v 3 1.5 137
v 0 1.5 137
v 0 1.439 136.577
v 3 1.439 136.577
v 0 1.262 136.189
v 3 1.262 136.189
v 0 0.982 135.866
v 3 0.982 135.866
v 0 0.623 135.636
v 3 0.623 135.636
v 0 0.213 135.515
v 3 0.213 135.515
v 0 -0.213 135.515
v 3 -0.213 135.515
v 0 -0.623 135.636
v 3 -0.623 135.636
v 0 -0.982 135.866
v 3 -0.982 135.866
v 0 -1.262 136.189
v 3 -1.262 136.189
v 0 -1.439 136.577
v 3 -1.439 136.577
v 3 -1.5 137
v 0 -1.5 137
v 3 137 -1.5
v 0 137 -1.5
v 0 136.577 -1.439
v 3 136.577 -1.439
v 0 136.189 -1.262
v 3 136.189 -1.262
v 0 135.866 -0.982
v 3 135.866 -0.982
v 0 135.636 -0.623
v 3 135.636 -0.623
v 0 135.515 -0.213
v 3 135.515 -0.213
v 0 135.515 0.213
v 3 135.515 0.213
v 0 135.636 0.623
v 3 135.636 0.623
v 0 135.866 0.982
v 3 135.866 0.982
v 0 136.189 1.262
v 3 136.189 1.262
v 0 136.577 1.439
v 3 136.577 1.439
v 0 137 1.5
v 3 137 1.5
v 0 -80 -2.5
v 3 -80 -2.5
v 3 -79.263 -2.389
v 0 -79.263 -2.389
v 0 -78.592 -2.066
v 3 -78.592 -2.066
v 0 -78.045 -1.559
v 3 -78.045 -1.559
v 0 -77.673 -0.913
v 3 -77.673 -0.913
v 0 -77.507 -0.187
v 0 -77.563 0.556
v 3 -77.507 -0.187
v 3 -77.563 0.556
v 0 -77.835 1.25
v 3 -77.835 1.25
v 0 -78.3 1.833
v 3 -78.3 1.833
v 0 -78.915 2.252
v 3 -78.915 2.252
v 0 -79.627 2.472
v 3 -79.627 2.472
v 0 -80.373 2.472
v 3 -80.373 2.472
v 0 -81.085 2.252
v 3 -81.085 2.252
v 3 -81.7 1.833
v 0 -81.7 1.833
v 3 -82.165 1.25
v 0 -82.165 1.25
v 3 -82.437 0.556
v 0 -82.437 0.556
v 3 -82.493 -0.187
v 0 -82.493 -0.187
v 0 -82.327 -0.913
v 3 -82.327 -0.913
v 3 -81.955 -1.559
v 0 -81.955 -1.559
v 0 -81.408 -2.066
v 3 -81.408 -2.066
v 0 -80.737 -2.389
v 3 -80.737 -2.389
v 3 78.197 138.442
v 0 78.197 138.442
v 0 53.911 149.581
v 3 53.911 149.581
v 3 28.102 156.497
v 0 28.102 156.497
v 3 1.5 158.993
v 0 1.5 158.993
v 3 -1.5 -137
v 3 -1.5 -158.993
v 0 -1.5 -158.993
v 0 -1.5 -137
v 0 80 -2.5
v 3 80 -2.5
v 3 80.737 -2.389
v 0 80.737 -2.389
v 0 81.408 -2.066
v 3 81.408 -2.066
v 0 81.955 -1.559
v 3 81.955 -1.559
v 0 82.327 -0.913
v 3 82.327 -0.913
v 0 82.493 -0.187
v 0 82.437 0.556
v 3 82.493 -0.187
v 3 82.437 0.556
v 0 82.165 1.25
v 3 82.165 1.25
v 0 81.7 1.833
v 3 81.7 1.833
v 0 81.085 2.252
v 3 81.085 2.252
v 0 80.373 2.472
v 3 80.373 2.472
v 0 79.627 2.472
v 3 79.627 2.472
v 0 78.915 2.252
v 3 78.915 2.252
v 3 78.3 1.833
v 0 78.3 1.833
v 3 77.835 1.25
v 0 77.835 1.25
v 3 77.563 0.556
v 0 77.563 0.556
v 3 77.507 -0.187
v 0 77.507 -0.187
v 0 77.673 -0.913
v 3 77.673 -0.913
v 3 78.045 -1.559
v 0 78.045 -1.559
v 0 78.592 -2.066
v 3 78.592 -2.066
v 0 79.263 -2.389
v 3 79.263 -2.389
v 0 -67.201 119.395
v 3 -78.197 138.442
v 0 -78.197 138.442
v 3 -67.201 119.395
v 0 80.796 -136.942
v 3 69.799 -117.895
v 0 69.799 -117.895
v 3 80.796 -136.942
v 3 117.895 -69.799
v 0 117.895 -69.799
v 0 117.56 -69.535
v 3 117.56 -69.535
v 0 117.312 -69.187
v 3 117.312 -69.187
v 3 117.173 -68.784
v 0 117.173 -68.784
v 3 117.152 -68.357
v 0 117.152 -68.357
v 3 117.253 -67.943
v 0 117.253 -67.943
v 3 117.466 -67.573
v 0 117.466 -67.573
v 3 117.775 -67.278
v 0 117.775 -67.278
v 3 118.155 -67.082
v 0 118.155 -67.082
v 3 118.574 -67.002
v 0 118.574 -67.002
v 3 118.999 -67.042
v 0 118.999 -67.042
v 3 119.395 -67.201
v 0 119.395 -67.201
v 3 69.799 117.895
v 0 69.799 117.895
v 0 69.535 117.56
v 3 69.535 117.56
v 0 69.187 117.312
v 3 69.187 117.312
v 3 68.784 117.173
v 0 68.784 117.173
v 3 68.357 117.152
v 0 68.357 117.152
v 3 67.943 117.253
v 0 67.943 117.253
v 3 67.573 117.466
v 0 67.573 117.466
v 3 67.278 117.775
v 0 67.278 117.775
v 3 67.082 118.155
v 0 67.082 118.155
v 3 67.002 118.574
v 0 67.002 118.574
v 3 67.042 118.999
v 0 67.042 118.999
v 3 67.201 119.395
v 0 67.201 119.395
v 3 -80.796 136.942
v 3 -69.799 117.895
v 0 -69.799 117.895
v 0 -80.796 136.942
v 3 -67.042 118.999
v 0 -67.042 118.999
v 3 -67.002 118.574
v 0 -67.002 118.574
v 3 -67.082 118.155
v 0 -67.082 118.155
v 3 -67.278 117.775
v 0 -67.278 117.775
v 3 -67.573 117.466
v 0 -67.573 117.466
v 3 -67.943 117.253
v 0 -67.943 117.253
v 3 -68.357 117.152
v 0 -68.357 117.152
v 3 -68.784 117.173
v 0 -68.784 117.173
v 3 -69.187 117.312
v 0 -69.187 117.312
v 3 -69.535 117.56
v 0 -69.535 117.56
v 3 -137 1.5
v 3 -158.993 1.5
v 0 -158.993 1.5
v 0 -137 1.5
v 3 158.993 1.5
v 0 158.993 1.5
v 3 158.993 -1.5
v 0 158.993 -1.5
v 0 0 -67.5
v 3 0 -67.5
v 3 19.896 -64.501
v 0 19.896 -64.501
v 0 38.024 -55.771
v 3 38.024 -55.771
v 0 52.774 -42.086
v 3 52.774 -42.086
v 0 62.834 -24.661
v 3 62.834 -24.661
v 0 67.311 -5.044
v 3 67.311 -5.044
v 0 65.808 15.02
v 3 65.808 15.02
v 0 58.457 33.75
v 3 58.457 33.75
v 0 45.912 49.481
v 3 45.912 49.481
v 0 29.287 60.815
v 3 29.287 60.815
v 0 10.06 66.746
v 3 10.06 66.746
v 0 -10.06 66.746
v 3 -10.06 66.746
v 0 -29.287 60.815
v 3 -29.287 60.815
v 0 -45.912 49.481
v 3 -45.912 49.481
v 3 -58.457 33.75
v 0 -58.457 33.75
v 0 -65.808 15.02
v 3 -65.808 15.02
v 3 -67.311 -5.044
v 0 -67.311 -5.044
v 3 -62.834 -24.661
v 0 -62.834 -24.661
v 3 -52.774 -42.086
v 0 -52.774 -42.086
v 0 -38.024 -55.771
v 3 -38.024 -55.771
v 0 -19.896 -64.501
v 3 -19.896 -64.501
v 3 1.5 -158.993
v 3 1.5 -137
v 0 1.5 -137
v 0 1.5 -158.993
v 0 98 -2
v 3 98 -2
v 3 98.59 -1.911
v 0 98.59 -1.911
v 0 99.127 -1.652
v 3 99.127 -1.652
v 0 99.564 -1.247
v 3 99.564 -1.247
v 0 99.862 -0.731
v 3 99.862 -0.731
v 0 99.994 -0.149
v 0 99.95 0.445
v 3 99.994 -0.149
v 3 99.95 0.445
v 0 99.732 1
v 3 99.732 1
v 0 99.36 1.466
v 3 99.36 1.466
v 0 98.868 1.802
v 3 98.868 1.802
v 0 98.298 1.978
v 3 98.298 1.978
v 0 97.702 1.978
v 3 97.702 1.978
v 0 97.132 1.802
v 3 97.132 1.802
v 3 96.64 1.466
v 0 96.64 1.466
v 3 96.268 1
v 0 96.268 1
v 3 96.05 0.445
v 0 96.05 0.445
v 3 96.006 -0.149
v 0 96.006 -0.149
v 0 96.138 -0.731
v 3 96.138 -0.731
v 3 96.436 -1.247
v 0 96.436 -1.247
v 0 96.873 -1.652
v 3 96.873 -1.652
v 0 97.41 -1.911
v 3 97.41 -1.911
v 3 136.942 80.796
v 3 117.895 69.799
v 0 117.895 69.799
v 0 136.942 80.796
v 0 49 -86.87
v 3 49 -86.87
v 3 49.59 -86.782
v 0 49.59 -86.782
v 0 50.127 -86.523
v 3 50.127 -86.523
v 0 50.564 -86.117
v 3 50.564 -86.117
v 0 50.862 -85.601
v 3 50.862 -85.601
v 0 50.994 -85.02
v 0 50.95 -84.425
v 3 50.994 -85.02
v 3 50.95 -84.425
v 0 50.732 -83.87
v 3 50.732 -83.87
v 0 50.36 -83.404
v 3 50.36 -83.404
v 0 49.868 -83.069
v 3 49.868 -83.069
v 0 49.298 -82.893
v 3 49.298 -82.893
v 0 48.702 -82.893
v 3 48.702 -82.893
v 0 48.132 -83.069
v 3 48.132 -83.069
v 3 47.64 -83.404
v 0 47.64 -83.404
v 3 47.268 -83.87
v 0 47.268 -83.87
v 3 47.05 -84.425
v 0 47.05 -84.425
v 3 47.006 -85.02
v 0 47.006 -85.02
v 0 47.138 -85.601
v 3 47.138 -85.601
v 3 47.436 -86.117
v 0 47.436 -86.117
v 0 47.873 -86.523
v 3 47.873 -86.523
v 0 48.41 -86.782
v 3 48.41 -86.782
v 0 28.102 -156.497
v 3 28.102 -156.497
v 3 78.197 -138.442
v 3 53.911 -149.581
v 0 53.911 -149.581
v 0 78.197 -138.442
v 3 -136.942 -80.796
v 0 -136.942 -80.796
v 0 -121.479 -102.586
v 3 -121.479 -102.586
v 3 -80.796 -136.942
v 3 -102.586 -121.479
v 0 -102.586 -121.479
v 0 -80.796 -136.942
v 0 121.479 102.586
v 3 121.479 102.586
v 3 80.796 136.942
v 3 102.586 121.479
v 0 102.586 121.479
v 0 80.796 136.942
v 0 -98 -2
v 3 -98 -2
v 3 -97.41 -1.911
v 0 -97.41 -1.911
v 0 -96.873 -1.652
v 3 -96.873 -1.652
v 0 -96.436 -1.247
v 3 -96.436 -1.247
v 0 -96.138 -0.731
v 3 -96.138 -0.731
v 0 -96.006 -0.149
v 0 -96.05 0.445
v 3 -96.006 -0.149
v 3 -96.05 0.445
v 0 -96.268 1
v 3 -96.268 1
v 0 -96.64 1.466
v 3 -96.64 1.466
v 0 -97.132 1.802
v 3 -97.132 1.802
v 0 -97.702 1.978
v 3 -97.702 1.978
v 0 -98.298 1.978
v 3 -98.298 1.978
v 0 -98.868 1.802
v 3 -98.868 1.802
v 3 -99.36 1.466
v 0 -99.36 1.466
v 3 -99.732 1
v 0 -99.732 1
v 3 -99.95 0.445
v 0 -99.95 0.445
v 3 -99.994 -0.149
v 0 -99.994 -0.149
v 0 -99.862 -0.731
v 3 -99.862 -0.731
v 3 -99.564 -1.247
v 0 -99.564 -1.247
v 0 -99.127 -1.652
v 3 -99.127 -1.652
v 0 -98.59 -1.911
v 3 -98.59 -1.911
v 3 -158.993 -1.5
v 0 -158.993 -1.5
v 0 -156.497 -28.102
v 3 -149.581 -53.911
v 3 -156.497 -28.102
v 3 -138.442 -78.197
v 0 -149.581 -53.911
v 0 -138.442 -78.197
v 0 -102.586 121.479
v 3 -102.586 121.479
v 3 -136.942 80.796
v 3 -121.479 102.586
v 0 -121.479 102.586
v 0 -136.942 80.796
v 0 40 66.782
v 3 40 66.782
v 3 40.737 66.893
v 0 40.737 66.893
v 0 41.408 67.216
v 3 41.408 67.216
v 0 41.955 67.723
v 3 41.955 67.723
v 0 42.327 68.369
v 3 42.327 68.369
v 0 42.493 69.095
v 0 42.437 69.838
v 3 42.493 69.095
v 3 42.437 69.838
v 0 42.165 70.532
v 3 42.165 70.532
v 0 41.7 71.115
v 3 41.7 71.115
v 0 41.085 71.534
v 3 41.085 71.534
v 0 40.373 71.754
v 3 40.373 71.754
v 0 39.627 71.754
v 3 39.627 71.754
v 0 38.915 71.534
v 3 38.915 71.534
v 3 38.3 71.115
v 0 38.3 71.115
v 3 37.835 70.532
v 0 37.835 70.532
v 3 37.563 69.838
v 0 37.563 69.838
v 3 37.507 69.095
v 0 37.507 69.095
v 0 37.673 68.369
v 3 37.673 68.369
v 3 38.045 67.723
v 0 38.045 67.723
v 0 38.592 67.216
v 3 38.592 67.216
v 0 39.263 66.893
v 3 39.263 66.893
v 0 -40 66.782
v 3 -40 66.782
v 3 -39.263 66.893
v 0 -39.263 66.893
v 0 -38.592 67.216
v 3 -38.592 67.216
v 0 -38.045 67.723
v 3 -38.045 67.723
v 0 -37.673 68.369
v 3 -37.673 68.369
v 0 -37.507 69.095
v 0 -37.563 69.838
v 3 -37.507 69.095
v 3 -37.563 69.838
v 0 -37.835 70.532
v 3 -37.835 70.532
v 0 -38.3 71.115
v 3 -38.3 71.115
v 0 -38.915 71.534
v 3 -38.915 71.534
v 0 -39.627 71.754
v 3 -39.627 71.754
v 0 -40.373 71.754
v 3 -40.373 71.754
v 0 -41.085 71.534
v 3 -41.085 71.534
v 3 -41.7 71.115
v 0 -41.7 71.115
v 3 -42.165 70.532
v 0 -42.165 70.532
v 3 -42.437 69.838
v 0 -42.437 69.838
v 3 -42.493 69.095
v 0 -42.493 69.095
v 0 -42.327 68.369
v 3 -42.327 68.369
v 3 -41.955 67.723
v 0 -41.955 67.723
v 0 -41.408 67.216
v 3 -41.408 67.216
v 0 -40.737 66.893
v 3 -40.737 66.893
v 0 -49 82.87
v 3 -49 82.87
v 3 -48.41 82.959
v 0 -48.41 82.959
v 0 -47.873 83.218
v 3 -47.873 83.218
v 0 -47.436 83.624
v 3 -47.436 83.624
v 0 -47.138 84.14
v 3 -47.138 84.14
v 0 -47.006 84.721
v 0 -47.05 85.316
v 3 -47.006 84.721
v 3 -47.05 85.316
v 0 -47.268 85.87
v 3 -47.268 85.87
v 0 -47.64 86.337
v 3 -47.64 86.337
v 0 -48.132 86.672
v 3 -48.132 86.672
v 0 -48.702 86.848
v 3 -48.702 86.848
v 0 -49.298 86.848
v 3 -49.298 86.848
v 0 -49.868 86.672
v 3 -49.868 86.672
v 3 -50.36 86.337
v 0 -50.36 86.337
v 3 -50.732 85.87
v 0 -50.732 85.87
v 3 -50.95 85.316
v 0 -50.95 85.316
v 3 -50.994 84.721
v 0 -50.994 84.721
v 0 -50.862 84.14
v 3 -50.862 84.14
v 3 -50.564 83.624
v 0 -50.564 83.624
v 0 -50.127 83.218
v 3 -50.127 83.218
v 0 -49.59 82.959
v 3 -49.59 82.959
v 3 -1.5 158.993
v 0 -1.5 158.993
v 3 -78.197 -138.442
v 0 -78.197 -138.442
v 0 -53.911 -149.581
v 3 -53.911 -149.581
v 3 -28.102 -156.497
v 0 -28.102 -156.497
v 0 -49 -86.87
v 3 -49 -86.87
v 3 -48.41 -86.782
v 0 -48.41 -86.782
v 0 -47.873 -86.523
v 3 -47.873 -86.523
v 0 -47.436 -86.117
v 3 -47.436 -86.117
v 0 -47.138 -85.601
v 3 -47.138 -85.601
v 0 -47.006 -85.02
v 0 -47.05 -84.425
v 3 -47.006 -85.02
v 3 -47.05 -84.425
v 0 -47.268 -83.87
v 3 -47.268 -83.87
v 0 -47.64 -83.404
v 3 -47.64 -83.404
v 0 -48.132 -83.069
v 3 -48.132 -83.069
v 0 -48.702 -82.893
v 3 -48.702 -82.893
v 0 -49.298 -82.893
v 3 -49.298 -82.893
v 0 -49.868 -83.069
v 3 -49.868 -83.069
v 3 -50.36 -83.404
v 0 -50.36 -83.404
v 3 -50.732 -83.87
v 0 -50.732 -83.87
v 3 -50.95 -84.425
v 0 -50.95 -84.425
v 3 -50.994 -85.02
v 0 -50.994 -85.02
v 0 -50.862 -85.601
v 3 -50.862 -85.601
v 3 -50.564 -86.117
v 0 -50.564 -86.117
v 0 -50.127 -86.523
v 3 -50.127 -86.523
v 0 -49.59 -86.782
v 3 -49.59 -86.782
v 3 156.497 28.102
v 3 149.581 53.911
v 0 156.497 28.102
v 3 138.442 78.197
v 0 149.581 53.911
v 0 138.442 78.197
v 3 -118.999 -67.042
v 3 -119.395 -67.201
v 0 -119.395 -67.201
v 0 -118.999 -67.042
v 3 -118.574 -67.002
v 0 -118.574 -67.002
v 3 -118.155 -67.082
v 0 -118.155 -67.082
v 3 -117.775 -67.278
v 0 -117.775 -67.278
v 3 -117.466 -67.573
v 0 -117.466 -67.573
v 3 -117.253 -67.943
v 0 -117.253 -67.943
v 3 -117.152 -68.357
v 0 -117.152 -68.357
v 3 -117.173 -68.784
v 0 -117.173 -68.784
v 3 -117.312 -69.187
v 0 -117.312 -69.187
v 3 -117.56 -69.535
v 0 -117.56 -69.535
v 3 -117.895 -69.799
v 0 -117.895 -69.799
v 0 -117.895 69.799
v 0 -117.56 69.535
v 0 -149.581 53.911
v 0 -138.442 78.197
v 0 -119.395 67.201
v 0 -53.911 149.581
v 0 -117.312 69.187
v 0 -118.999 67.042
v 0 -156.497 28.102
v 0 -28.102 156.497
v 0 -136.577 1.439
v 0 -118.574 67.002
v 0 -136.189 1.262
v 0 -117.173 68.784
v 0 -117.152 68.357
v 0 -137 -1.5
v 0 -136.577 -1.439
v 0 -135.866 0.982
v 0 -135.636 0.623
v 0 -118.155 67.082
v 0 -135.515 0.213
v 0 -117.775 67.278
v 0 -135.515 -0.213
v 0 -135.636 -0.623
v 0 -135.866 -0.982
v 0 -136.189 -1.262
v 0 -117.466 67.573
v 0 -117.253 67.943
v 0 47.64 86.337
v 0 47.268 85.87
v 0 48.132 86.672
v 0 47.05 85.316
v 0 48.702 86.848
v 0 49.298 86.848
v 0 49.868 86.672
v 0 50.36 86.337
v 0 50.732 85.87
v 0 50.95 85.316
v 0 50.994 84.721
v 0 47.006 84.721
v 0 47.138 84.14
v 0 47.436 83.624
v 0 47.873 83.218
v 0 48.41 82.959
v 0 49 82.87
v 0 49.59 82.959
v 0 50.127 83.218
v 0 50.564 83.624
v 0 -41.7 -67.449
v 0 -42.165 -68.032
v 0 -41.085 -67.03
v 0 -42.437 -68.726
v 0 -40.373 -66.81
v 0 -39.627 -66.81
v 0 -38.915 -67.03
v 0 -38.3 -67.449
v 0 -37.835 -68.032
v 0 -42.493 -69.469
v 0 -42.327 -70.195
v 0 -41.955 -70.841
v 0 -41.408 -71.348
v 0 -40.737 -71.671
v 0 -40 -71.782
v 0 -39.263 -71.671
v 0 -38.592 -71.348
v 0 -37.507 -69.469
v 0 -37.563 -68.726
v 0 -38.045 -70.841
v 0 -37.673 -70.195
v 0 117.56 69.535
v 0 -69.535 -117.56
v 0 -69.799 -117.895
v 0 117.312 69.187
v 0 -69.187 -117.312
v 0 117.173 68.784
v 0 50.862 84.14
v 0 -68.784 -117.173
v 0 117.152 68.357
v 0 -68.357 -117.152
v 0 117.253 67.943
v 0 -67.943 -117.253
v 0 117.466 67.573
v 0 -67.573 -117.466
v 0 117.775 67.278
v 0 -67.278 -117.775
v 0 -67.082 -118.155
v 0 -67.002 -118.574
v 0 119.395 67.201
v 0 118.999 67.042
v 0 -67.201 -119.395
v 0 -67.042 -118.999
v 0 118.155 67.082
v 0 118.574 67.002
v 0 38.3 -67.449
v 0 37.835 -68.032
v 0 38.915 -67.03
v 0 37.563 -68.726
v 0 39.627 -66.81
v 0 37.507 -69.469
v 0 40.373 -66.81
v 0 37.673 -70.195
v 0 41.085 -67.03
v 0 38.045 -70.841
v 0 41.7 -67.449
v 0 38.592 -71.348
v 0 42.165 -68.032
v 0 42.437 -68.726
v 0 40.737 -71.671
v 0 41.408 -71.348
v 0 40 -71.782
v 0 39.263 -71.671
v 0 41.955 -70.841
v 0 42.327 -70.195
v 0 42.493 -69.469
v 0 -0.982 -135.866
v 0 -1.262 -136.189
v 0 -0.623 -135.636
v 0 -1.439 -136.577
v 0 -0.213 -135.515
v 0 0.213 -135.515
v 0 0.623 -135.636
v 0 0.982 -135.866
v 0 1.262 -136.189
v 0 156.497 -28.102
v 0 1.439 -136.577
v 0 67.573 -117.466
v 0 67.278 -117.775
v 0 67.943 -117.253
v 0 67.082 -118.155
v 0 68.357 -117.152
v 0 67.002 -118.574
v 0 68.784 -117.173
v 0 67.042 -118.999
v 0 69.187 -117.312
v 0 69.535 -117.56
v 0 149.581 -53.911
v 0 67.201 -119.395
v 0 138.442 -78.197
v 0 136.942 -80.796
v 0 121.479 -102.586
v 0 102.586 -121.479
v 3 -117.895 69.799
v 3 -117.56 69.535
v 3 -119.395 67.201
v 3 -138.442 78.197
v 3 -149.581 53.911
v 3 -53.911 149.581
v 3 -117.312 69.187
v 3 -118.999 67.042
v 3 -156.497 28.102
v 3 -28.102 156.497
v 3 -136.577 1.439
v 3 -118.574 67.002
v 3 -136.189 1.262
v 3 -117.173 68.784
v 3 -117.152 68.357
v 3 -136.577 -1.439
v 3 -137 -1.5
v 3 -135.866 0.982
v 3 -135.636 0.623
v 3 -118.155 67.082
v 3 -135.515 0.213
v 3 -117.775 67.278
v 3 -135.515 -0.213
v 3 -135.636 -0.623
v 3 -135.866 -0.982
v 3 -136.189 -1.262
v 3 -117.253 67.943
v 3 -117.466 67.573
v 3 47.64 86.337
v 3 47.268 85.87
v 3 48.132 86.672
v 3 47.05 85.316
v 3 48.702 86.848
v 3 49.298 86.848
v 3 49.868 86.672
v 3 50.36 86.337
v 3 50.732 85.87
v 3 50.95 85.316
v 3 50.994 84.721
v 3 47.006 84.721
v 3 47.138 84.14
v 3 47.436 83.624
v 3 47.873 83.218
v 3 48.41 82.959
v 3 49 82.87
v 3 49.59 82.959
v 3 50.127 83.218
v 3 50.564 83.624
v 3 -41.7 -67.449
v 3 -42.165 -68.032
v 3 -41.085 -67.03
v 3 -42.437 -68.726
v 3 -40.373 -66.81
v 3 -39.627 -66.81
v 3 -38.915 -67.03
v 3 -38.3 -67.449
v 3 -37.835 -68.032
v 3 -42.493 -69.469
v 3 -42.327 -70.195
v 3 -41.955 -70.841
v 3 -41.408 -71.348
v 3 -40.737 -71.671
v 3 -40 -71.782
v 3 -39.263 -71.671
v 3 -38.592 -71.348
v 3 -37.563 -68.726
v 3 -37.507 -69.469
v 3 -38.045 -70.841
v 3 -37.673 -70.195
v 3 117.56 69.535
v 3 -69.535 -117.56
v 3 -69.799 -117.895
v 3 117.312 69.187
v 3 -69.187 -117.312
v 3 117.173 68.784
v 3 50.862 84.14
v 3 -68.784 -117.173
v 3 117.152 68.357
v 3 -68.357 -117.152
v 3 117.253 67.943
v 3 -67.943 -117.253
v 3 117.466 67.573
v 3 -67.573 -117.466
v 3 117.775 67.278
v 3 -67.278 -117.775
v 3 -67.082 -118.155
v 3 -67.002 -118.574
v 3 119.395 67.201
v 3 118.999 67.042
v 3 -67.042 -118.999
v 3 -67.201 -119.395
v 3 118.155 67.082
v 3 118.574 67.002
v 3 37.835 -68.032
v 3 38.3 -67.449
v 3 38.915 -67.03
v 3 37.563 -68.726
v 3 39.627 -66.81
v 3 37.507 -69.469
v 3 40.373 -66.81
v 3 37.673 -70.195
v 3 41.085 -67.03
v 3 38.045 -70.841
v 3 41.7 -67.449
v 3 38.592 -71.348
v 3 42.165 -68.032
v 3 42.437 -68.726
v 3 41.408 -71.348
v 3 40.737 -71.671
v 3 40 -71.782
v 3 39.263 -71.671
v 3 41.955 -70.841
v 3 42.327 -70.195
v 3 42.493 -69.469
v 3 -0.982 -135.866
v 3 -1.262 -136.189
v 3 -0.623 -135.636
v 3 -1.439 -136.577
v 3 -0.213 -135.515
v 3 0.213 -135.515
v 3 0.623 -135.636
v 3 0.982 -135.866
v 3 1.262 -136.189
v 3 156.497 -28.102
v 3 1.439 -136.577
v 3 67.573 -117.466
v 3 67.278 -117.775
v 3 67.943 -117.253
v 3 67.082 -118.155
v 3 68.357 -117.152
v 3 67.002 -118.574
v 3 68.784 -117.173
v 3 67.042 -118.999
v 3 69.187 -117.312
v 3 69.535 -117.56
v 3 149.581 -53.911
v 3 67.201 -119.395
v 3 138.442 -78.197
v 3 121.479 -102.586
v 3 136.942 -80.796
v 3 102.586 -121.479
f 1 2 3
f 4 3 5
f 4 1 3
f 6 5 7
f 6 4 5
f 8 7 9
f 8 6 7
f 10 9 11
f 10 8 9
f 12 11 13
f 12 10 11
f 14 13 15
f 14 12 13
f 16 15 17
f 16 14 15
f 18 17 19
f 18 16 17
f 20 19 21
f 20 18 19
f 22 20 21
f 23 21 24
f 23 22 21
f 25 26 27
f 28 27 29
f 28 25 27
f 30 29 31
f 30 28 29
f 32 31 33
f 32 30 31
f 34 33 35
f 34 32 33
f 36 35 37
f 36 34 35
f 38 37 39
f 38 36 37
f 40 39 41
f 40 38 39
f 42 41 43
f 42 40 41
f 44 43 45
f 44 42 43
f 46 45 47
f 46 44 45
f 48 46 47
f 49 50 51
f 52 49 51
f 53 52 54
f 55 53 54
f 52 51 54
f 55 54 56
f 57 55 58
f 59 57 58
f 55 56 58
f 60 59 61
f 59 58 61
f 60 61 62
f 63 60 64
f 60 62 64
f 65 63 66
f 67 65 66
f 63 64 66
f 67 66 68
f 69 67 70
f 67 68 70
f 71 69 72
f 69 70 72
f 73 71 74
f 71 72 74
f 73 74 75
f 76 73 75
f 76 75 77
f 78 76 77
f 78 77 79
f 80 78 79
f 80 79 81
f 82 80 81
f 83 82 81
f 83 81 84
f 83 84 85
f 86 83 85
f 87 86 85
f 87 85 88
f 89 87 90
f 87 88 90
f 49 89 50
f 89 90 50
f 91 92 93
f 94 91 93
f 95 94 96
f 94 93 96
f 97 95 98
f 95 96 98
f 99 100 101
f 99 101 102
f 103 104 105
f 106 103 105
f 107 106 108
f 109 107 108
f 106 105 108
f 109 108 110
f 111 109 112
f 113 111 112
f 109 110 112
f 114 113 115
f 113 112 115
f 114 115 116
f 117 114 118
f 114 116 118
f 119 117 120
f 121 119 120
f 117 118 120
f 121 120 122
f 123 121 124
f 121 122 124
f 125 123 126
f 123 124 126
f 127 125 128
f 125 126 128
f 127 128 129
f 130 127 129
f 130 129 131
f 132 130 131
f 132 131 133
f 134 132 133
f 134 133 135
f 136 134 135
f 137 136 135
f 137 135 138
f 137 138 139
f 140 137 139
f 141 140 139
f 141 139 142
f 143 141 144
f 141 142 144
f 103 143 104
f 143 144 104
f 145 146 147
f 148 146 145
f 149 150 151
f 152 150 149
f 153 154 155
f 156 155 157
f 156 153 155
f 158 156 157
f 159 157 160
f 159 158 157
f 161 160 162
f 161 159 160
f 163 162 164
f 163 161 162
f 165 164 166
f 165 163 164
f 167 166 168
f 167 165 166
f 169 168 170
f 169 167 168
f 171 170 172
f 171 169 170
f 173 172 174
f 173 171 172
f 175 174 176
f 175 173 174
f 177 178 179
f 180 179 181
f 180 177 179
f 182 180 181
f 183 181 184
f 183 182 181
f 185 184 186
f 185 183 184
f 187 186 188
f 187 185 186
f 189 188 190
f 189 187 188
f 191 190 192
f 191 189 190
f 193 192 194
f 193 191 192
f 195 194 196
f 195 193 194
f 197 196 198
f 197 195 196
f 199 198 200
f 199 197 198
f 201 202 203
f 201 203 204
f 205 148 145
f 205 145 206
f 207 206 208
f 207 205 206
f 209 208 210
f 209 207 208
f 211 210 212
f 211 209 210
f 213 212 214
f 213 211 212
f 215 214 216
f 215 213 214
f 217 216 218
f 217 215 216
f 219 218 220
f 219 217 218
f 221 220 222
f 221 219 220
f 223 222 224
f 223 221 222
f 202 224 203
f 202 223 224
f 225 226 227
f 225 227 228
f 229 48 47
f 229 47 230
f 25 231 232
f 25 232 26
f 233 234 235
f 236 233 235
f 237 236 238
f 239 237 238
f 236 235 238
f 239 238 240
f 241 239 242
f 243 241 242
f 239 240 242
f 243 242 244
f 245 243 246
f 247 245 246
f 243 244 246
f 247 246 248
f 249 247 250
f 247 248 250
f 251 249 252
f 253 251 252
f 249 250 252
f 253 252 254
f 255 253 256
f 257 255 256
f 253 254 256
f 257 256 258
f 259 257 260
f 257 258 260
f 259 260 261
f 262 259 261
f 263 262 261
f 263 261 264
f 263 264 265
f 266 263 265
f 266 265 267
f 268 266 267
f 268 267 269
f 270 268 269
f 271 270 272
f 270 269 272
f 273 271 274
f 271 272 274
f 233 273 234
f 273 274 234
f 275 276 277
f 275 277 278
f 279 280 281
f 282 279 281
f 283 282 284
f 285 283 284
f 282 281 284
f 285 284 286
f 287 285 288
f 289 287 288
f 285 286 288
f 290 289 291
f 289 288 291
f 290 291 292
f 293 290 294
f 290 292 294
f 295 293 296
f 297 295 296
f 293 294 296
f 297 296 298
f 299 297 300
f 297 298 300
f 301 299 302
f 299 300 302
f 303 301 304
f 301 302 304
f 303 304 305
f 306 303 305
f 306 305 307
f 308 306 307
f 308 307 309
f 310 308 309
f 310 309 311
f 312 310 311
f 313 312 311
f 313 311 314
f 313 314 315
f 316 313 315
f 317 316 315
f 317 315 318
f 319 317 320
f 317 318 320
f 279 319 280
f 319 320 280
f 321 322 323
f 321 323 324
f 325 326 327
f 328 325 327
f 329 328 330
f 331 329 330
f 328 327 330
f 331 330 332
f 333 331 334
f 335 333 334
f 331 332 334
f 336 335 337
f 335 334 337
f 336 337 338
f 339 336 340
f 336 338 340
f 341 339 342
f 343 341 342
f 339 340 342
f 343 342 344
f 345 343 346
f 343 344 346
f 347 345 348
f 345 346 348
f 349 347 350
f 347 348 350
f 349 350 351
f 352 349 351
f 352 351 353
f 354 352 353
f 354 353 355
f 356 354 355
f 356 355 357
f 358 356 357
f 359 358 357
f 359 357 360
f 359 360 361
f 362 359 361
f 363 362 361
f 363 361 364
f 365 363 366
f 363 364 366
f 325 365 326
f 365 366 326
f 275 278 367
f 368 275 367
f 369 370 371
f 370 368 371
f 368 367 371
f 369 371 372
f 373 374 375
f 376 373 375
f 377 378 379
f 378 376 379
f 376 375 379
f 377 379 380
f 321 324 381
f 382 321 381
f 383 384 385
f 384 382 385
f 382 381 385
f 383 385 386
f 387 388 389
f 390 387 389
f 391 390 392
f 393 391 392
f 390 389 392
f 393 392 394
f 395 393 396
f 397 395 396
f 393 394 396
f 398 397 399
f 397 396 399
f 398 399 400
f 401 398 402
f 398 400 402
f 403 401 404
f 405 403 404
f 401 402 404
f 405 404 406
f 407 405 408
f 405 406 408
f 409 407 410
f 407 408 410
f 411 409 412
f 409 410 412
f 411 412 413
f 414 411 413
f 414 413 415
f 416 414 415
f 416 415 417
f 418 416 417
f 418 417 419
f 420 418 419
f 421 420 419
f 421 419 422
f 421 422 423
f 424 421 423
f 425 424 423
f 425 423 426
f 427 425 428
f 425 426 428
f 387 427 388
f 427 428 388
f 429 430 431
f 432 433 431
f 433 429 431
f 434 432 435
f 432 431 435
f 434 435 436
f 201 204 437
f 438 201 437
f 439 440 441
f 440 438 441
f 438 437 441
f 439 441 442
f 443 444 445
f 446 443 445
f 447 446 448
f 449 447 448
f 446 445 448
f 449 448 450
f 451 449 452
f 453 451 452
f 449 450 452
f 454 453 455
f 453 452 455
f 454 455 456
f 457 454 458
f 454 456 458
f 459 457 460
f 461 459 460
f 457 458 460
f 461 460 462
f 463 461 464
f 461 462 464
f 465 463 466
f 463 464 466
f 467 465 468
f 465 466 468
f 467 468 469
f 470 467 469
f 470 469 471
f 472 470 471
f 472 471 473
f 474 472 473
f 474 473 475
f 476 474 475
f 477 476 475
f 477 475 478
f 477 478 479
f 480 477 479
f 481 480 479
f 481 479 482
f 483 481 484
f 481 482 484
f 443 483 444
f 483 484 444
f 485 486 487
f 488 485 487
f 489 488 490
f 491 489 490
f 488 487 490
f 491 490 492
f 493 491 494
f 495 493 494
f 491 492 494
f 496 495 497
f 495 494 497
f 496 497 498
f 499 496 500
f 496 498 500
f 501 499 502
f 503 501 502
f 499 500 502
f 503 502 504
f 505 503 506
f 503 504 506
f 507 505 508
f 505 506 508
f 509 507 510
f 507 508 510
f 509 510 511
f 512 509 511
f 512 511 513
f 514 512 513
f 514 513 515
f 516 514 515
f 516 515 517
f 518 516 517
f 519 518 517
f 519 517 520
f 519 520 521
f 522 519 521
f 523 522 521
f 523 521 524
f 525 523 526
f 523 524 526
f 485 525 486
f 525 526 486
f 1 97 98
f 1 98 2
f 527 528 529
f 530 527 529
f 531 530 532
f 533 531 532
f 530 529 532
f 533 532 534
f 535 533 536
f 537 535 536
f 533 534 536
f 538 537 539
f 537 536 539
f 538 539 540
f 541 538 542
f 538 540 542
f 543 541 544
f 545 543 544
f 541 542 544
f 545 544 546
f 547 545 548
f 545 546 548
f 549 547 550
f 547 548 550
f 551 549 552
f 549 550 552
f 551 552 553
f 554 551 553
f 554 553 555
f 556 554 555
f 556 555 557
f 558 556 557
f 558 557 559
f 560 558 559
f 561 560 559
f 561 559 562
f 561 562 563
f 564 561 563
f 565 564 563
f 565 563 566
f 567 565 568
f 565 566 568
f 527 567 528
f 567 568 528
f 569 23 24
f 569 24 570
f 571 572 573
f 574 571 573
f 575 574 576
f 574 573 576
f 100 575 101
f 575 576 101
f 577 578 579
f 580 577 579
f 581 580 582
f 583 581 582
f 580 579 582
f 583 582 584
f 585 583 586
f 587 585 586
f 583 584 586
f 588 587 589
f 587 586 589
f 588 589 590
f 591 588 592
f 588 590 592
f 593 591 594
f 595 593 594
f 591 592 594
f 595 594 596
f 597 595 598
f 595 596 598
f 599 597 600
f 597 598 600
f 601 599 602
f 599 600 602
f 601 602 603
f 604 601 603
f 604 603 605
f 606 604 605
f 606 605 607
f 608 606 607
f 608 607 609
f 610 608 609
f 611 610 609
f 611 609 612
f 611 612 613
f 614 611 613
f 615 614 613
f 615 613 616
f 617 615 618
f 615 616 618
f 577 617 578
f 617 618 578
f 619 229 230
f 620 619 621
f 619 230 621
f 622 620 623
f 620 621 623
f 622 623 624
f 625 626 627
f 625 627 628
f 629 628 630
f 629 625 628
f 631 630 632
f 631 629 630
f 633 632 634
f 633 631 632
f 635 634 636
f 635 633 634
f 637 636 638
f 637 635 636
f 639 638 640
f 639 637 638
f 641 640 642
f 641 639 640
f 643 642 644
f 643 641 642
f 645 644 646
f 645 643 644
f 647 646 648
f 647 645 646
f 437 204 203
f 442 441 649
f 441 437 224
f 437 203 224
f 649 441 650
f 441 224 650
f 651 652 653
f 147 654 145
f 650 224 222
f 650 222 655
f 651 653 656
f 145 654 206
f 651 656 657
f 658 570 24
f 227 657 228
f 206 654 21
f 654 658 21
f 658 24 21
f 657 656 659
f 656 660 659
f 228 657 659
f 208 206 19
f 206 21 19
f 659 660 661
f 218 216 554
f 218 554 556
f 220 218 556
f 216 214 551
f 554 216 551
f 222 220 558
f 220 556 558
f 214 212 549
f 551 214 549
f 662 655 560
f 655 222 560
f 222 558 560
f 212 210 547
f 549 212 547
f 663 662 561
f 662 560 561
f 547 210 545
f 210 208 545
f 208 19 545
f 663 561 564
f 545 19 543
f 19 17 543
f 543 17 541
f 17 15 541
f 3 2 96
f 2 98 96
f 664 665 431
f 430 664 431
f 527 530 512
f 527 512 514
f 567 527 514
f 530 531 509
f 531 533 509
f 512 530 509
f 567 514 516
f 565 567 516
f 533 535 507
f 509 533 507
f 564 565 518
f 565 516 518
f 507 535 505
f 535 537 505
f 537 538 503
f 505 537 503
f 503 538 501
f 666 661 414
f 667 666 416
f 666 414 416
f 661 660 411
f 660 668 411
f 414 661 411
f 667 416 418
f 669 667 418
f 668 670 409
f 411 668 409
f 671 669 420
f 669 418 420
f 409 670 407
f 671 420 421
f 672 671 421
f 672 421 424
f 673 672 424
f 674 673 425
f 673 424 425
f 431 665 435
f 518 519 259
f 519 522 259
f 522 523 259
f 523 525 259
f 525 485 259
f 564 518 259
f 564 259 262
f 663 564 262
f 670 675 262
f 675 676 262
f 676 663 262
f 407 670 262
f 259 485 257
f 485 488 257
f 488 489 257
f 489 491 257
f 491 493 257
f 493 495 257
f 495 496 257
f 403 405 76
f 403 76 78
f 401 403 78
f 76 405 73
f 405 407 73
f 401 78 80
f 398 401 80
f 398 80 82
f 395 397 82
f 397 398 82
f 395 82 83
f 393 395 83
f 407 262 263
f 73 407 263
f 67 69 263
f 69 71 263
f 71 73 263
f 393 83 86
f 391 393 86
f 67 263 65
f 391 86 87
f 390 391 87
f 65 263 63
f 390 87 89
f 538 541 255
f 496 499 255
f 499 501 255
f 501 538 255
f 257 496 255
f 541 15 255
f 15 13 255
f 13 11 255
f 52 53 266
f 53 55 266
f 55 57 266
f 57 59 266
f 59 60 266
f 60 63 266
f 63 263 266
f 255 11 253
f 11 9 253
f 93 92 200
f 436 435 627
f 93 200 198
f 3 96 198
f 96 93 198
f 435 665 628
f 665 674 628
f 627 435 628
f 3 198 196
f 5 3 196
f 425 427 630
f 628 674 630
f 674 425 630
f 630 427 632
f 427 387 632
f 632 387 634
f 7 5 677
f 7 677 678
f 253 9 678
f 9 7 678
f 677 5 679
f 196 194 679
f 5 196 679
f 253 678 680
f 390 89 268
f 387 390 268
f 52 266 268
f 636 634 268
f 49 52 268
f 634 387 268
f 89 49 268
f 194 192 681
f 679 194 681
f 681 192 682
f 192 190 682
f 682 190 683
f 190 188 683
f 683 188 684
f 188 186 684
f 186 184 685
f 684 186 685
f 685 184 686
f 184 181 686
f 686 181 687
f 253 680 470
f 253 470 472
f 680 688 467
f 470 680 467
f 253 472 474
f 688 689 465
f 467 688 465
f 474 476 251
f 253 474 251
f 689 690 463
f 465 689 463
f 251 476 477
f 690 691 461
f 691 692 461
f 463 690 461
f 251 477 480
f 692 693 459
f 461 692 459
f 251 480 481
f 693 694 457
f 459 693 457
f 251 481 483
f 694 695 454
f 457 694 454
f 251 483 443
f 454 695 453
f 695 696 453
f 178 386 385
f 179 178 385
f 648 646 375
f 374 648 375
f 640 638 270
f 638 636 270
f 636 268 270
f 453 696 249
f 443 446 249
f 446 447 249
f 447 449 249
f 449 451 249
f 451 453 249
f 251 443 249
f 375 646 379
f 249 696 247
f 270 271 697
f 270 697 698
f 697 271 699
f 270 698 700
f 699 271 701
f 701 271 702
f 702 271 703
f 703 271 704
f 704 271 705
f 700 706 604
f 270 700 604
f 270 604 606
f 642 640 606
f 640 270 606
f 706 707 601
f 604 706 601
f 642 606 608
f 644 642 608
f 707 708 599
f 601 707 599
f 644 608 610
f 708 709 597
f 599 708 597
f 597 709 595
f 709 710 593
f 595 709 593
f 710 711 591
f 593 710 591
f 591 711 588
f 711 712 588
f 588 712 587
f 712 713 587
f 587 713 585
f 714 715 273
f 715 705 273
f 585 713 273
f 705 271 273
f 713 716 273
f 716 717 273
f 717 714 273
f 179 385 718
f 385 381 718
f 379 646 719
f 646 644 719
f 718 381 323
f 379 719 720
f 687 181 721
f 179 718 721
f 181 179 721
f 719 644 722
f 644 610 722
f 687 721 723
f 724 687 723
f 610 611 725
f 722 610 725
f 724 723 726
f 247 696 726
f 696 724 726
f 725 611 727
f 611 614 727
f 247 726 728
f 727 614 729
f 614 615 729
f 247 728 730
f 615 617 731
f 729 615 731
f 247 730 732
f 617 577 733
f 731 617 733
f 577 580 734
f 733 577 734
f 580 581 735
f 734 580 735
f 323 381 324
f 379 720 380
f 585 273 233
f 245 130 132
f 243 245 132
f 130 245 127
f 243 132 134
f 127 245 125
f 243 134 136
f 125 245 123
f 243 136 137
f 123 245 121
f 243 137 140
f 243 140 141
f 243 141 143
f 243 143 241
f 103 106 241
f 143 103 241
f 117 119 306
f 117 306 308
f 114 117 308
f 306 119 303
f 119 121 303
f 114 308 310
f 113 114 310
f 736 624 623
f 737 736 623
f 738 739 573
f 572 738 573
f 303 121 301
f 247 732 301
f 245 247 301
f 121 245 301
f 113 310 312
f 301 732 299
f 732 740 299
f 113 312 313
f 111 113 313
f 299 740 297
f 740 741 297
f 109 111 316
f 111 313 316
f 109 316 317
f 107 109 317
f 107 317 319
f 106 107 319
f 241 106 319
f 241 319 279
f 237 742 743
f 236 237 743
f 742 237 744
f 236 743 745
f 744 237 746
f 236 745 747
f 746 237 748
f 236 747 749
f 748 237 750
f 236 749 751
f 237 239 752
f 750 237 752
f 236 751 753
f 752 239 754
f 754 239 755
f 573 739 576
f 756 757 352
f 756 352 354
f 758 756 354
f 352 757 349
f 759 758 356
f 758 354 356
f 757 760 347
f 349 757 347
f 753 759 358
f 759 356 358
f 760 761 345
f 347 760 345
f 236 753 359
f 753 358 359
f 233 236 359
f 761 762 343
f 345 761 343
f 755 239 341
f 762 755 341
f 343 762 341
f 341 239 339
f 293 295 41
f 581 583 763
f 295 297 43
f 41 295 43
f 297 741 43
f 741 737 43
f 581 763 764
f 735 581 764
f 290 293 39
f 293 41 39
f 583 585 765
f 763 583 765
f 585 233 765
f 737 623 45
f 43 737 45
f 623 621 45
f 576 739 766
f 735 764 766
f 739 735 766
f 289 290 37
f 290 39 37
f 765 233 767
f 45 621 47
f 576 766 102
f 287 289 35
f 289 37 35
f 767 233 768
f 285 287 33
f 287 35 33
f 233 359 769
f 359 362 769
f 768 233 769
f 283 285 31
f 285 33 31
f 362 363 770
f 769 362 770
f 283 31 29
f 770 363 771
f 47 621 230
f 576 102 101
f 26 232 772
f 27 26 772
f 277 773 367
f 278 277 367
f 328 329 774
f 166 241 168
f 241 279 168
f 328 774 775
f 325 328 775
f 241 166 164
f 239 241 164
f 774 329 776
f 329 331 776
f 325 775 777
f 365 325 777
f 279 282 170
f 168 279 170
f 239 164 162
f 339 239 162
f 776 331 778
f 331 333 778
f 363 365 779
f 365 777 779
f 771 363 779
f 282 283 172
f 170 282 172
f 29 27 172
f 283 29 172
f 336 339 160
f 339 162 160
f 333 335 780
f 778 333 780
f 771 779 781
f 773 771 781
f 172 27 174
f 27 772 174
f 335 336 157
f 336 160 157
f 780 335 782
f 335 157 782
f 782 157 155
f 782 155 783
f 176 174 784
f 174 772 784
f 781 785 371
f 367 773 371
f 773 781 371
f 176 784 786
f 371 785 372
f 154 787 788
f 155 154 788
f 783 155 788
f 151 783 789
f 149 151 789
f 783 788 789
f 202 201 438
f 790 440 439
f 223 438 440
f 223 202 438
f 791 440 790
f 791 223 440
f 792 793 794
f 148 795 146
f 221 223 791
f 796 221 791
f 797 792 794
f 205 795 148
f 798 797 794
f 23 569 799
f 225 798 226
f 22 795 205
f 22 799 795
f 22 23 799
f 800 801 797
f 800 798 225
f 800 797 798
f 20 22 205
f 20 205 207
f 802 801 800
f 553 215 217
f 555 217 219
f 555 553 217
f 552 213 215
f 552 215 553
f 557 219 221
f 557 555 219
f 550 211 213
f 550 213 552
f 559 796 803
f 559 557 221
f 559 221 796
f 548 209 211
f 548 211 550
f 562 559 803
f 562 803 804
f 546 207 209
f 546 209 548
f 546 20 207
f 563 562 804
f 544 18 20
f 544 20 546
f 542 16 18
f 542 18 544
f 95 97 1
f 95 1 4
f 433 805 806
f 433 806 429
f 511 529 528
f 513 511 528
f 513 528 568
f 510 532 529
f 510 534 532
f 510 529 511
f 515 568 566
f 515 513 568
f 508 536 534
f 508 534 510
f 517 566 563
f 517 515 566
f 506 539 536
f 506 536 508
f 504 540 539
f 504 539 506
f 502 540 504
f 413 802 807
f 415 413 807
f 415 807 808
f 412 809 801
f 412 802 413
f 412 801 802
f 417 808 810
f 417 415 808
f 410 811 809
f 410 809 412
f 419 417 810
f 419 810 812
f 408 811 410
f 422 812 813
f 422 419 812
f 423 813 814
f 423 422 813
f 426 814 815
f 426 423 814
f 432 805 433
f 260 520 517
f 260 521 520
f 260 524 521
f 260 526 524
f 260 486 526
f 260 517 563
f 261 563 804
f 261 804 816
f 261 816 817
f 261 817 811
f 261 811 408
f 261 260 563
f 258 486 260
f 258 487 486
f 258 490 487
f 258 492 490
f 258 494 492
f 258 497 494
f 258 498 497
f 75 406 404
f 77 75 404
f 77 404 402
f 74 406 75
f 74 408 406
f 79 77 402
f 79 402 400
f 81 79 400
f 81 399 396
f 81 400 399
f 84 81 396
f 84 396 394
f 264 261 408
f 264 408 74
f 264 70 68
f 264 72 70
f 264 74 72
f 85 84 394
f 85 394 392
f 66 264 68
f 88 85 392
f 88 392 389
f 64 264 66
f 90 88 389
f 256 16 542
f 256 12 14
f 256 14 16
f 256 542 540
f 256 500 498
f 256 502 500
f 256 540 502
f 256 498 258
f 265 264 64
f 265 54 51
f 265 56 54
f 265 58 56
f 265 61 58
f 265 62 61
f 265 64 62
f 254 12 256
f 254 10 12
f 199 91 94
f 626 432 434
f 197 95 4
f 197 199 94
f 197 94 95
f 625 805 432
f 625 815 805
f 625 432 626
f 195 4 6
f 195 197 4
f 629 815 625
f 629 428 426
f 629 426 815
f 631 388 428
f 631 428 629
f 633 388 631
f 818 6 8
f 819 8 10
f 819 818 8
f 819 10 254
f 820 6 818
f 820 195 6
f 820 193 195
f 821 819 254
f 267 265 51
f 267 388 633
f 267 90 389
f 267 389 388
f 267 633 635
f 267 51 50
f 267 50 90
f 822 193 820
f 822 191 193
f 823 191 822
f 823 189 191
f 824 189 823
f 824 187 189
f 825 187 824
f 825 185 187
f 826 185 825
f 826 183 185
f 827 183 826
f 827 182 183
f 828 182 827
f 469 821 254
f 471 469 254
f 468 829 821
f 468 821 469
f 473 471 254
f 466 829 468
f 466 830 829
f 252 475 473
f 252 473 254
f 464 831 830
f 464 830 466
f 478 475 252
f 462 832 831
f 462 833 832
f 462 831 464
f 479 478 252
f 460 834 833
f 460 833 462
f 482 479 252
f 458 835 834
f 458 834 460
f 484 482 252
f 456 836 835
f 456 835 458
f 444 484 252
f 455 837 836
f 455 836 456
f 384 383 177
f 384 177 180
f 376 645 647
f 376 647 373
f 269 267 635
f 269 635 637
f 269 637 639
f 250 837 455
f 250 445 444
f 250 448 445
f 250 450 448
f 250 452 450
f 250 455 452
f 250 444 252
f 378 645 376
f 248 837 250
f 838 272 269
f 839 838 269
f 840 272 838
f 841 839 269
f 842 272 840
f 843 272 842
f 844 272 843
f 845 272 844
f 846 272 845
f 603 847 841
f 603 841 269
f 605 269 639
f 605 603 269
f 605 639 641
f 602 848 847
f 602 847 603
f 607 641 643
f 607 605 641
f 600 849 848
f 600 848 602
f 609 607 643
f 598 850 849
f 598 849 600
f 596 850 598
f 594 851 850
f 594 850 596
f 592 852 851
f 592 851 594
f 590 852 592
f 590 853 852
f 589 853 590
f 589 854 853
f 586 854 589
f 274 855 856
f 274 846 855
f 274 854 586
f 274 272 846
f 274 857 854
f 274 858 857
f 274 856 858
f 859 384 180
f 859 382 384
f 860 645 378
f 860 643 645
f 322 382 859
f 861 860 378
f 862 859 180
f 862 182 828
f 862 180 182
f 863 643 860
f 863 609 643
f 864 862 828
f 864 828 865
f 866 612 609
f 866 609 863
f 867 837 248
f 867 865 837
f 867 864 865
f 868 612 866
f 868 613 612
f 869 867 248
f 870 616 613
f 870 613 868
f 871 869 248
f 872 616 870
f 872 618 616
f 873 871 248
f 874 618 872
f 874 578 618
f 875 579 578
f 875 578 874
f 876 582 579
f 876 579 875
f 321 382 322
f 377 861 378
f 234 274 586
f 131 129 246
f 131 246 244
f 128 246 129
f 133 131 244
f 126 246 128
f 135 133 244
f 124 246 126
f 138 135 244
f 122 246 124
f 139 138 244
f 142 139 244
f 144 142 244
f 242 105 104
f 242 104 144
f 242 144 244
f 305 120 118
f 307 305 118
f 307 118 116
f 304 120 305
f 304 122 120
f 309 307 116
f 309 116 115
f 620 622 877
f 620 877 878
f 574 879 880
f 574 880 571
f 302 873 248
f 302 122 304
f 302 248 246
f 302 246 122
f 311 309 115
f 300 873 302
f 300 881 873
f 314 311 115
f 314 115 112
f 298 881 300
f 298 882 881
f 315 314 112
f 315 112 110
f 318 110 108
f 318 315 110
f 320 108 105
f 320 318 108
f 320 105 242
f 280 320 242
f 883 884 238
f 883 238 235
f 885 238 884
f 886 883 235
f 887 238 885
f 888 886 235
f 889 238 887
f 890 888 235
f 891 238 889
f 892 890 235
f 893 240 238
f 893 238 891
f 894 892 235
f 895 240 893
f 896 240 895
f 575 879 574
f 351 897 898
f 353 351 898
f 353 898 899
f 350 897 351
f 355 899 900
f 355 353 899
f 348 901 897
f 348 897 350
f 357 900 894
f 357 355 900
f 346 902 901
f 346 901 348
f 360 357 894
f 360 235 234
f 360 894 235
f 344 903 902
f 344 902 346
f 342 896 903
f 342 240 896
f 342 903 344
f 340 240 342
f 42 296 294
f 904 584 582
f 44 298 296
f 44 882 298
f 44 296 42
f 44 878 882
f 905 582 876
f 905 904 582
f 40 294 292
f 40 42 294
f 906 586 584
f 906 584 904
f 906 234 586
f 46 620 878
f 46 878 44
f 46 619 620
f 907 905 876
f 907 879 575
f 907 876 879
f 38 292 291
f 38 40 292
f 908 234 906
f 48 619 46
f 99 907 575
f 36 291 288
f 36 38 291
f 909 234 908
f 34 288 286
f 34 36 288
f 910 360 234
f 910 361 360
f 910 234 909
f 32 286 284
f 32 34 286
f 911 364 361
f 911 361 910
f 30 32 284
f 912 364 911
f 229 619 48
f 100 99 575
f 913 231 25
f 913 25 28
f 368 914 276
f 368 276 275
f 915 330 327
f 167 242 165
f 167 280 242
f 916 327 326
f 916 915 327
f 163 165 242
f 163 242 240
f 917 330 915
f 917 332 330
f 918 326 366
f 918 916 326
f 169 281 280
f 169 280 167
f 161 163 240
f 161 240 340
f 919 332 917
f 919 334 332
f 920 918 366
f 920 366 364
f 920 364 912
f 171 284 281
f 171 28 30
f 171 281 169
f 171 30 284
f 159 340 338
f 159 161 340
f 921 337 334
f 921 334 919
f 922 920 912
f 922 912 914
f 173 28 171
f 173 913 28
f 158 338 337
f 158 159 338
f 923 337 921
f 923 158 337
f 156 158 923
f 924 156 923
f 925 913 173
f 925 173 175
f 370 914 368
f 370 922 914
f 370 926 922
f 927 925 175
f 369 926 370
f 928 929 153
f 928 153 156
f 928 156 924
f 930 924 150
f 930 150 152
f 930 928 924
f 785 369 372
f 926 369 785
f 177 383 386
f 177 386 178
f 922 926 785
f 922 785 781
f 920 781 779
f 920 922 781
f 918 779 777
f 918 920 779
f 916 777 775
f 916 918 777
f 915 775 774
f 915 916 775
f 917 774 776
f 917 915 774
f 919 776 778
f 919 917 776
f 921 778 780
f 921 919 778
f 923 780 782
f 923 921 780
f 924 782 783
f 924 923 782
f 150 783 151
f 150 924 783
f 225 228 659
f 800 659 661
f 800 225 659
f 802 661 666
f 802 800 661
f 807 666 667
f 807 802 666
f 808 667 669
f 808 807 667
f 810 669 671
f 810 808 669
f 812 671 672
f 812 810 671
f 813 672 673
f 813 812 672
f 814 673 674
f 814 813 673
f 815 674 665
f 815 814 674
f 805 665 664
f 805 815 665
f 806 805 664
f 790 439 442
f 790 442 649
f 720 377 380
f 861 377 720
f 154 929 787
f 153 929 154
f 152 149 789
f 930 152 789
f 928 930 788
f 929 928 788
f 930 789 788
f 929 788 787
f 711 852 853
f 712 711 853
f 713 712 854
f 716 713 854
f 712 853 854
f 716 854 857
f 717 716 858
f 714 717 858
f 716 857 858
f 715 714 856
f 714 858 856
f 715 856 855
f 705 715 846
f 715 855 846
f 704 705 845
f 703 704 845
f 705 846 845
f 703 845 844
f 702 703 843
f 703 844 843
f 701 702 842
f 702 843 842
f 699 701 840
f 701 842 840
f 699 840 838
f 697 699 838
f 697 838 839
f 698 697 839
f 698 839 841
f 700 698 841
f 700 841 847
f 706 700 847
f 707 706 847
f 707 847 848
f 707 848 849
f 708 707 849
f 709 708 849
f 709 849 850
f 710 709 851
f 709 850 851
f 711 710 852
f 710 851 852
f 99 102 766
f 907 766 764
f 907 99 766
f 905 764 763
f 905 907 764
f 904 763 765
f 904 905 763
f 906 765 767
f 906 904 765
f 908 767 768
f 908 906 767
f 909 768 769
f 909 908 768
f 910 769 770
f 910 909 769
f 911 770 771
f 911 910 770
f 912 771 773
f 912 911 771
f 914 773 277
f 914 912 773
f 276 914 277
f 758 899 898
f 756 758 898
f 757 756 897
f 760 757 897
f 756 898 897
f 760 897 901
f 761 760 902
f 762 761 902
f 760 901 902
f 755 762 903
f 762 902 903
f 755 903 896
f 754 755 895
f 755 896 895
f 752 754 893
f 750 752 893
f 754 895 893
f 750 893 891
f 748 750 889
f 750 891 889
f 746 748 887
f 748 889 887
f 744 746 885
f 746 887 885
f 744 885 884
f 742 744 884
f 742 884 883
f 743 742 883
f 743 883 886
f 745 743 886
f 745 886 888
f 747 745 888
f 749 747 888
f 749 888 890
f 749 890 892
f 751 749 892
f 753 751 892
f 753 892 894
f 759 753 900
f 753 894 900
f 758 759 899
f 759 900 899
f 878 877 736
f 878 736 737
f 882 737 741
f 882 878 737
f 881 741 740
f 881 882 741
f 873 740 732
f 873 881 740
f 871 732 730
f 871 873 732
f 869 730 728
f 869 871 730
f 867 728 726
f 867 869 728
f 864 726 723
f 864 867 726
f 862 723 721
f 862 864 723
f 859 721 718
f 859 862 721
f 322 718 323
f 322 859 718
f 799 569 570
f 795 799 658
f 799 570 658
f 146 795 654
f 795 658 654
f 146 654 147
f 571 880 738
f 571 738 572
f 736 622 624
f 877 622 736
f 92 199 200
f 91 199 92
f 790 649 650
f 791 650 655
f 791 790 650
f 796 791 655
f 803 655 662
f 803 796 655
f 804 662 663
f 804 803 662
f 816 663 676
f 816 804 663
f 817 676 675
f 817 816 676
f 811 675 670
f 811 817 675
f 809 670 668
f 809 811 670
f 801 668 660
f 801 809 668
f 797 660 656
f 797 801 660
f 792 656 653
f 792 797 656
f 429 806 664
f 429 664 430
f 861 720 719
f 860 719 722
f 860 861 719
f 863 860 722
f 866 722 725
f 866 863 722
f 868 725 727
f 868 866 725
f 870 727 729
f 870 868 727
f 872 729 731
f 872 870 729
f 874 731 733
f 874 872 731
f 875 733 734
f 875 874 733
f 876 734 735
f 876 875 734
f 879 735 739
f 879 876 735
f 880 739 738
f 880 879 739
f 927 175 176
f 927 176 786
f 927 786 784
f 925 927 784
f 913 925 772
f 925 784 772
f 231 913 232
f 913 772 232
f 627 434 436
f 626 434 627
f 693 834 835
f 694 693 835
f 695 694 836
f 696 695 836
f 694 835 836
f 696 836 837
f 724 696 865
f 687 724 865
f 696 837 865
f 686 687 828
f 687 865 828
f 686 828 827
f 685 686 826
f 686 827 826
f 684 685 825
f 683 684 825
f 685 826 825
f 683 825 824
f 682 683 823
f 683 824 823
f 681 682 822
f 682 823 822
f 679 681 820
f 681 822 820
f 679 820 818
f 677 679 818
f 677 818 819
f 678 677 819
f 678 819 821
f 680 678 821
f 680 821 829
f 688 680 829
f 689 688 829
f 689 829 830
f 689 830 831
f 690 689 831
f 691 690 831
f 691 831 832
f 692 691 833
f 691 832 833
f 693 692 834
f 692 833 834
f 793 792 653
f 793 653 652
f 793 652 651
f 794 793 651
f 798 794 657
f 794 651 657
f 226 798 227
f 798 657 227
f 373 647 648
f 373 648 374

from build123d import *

# Parameters (mm, degrees)
SKETCH1_R           = 159
BOSS_EXTRUDE1_DEPTH = 3
SKETCH2_R           = 2
SKETCH2_R_2         = 1.5
SKETCH2_R_3         = 2.5
SKETCH2_R_4         = 67.5
CUT_EXTRUDE1_DEPTH  = 3
CUT_EXTRUDE2_DEPTH  = 225.879967983
CIRPATTERN1_COUNT   = 12


with BuildPart() as part:
    # Sketch1 → Boss-Extrude1 (new body)
    with BuildSketch(Plane(origin=(0, 0, 0), x_dir=(0, 0, -1), z_dir=(1, 0, 0))):
        Circle(SKETCH1_R)
    extrude(amount=BOSS_EXTRUDE1_DEPTH)

    # Sketch2 → Cut-Extrude1 (cut)
    with BuildSketch(Plane(origin=(3, 0, 0), x_dir=(0, 0, -1), z_dir=(1, 0, 0))):
        with Locations((0, -98)):
            Circle(SKETCH2_R)
        with Locations((-84.870489571, -49)):
            Circle(SKETCH2_R)
        with Locations((-84.870489571, 49)):
            Circle(SKETCH2_R)
        with Locations((0, 98)):
            Circle(SKETCH2_R)
        with Locations((84.870489571, 49)):
            Circle(SKETCH2_R)
        with Locations((84.870489571, -49)):
            Circle(SKETCH2_R)
        with Locations((0, -150)):
            Circle(SKETCH2_R_2)
        with Locations((-129.903810568, -75)):
            Circle(SKETCH2_R_2)
        with Locations((-129.903810568, 75)):
            Circle(SKETCH2_R_2)
        with Locations((0, 150)):
            Circle(SKETCH2_R_2)
        with Locations((129.903810568, 75)):
            Circle(SKETCH2_R_2)
        with Locations((129.903810568, -75)):
            Circle(SKETCH2_R_2)
        with Locations((0, -80)):
            Circle(SKETCH2_R_3)
        with Locations((-69.282032303, -40)):
            Circle(SKETCH2_R_3)
        with Locations((-69.282032303, 40)):
            Circle(SKETCH2_R_3)
        with Locations((0, 80)):
            Circle(SKETCH2_R_3)
        with Locations((69.282032303, 40)):
            Circle(SKETCH2_R_3)
        with Locations((69.282032303, -40)):
            Circle(SKETCH2_R_3)
        Circle(SKETCH2_R_4)
    extrude(amount=-CUT_EXTRUDE1_DEPTH, mode=Mode.SUBTRACT)

    # Sketch3 → Cut-Extrude2 (cut, through all)
    with BuildSketch(Plane(origin=(3, 0, 0), x_dir=(0, 0, -1), z_dir=(1, 0, 0))):
        with BuildLine():
            Line((117.895480318, 69.799038106), (148.709562393, 87.589556686))
            ThreePointArc((148.709562393, 87.589556686), (150.758600499, 87.040518581), (150.209562393, 84.991480475))
            Line((150.209562393, 84.991480475), (119.395480318, 67.200961894))
            ThreePointArc((119.395480318, 67.200961894), (117.346442213, 67.75), (117.895480318, 69.799038106))
        make_face()
    cut_extrude2 = extrude(amount=-CUT_EXTRUDE2_DEPTH, mode=Mode.SUBTRACT)

    # CirPattern1: Cut-Extrude2 ×12 about axis
    cirpattern1_axis = Axis((0, 0, 0), (1, 0, 0))
    for i in range(1, CIRPATTERN1_COUNT):
        add(cut_extrude2.rotate(cirpattern1_axis, i * 360 / CIRPATTERN1_COUNT), mode=Mode.SUBTRACT)


solid = part.part
